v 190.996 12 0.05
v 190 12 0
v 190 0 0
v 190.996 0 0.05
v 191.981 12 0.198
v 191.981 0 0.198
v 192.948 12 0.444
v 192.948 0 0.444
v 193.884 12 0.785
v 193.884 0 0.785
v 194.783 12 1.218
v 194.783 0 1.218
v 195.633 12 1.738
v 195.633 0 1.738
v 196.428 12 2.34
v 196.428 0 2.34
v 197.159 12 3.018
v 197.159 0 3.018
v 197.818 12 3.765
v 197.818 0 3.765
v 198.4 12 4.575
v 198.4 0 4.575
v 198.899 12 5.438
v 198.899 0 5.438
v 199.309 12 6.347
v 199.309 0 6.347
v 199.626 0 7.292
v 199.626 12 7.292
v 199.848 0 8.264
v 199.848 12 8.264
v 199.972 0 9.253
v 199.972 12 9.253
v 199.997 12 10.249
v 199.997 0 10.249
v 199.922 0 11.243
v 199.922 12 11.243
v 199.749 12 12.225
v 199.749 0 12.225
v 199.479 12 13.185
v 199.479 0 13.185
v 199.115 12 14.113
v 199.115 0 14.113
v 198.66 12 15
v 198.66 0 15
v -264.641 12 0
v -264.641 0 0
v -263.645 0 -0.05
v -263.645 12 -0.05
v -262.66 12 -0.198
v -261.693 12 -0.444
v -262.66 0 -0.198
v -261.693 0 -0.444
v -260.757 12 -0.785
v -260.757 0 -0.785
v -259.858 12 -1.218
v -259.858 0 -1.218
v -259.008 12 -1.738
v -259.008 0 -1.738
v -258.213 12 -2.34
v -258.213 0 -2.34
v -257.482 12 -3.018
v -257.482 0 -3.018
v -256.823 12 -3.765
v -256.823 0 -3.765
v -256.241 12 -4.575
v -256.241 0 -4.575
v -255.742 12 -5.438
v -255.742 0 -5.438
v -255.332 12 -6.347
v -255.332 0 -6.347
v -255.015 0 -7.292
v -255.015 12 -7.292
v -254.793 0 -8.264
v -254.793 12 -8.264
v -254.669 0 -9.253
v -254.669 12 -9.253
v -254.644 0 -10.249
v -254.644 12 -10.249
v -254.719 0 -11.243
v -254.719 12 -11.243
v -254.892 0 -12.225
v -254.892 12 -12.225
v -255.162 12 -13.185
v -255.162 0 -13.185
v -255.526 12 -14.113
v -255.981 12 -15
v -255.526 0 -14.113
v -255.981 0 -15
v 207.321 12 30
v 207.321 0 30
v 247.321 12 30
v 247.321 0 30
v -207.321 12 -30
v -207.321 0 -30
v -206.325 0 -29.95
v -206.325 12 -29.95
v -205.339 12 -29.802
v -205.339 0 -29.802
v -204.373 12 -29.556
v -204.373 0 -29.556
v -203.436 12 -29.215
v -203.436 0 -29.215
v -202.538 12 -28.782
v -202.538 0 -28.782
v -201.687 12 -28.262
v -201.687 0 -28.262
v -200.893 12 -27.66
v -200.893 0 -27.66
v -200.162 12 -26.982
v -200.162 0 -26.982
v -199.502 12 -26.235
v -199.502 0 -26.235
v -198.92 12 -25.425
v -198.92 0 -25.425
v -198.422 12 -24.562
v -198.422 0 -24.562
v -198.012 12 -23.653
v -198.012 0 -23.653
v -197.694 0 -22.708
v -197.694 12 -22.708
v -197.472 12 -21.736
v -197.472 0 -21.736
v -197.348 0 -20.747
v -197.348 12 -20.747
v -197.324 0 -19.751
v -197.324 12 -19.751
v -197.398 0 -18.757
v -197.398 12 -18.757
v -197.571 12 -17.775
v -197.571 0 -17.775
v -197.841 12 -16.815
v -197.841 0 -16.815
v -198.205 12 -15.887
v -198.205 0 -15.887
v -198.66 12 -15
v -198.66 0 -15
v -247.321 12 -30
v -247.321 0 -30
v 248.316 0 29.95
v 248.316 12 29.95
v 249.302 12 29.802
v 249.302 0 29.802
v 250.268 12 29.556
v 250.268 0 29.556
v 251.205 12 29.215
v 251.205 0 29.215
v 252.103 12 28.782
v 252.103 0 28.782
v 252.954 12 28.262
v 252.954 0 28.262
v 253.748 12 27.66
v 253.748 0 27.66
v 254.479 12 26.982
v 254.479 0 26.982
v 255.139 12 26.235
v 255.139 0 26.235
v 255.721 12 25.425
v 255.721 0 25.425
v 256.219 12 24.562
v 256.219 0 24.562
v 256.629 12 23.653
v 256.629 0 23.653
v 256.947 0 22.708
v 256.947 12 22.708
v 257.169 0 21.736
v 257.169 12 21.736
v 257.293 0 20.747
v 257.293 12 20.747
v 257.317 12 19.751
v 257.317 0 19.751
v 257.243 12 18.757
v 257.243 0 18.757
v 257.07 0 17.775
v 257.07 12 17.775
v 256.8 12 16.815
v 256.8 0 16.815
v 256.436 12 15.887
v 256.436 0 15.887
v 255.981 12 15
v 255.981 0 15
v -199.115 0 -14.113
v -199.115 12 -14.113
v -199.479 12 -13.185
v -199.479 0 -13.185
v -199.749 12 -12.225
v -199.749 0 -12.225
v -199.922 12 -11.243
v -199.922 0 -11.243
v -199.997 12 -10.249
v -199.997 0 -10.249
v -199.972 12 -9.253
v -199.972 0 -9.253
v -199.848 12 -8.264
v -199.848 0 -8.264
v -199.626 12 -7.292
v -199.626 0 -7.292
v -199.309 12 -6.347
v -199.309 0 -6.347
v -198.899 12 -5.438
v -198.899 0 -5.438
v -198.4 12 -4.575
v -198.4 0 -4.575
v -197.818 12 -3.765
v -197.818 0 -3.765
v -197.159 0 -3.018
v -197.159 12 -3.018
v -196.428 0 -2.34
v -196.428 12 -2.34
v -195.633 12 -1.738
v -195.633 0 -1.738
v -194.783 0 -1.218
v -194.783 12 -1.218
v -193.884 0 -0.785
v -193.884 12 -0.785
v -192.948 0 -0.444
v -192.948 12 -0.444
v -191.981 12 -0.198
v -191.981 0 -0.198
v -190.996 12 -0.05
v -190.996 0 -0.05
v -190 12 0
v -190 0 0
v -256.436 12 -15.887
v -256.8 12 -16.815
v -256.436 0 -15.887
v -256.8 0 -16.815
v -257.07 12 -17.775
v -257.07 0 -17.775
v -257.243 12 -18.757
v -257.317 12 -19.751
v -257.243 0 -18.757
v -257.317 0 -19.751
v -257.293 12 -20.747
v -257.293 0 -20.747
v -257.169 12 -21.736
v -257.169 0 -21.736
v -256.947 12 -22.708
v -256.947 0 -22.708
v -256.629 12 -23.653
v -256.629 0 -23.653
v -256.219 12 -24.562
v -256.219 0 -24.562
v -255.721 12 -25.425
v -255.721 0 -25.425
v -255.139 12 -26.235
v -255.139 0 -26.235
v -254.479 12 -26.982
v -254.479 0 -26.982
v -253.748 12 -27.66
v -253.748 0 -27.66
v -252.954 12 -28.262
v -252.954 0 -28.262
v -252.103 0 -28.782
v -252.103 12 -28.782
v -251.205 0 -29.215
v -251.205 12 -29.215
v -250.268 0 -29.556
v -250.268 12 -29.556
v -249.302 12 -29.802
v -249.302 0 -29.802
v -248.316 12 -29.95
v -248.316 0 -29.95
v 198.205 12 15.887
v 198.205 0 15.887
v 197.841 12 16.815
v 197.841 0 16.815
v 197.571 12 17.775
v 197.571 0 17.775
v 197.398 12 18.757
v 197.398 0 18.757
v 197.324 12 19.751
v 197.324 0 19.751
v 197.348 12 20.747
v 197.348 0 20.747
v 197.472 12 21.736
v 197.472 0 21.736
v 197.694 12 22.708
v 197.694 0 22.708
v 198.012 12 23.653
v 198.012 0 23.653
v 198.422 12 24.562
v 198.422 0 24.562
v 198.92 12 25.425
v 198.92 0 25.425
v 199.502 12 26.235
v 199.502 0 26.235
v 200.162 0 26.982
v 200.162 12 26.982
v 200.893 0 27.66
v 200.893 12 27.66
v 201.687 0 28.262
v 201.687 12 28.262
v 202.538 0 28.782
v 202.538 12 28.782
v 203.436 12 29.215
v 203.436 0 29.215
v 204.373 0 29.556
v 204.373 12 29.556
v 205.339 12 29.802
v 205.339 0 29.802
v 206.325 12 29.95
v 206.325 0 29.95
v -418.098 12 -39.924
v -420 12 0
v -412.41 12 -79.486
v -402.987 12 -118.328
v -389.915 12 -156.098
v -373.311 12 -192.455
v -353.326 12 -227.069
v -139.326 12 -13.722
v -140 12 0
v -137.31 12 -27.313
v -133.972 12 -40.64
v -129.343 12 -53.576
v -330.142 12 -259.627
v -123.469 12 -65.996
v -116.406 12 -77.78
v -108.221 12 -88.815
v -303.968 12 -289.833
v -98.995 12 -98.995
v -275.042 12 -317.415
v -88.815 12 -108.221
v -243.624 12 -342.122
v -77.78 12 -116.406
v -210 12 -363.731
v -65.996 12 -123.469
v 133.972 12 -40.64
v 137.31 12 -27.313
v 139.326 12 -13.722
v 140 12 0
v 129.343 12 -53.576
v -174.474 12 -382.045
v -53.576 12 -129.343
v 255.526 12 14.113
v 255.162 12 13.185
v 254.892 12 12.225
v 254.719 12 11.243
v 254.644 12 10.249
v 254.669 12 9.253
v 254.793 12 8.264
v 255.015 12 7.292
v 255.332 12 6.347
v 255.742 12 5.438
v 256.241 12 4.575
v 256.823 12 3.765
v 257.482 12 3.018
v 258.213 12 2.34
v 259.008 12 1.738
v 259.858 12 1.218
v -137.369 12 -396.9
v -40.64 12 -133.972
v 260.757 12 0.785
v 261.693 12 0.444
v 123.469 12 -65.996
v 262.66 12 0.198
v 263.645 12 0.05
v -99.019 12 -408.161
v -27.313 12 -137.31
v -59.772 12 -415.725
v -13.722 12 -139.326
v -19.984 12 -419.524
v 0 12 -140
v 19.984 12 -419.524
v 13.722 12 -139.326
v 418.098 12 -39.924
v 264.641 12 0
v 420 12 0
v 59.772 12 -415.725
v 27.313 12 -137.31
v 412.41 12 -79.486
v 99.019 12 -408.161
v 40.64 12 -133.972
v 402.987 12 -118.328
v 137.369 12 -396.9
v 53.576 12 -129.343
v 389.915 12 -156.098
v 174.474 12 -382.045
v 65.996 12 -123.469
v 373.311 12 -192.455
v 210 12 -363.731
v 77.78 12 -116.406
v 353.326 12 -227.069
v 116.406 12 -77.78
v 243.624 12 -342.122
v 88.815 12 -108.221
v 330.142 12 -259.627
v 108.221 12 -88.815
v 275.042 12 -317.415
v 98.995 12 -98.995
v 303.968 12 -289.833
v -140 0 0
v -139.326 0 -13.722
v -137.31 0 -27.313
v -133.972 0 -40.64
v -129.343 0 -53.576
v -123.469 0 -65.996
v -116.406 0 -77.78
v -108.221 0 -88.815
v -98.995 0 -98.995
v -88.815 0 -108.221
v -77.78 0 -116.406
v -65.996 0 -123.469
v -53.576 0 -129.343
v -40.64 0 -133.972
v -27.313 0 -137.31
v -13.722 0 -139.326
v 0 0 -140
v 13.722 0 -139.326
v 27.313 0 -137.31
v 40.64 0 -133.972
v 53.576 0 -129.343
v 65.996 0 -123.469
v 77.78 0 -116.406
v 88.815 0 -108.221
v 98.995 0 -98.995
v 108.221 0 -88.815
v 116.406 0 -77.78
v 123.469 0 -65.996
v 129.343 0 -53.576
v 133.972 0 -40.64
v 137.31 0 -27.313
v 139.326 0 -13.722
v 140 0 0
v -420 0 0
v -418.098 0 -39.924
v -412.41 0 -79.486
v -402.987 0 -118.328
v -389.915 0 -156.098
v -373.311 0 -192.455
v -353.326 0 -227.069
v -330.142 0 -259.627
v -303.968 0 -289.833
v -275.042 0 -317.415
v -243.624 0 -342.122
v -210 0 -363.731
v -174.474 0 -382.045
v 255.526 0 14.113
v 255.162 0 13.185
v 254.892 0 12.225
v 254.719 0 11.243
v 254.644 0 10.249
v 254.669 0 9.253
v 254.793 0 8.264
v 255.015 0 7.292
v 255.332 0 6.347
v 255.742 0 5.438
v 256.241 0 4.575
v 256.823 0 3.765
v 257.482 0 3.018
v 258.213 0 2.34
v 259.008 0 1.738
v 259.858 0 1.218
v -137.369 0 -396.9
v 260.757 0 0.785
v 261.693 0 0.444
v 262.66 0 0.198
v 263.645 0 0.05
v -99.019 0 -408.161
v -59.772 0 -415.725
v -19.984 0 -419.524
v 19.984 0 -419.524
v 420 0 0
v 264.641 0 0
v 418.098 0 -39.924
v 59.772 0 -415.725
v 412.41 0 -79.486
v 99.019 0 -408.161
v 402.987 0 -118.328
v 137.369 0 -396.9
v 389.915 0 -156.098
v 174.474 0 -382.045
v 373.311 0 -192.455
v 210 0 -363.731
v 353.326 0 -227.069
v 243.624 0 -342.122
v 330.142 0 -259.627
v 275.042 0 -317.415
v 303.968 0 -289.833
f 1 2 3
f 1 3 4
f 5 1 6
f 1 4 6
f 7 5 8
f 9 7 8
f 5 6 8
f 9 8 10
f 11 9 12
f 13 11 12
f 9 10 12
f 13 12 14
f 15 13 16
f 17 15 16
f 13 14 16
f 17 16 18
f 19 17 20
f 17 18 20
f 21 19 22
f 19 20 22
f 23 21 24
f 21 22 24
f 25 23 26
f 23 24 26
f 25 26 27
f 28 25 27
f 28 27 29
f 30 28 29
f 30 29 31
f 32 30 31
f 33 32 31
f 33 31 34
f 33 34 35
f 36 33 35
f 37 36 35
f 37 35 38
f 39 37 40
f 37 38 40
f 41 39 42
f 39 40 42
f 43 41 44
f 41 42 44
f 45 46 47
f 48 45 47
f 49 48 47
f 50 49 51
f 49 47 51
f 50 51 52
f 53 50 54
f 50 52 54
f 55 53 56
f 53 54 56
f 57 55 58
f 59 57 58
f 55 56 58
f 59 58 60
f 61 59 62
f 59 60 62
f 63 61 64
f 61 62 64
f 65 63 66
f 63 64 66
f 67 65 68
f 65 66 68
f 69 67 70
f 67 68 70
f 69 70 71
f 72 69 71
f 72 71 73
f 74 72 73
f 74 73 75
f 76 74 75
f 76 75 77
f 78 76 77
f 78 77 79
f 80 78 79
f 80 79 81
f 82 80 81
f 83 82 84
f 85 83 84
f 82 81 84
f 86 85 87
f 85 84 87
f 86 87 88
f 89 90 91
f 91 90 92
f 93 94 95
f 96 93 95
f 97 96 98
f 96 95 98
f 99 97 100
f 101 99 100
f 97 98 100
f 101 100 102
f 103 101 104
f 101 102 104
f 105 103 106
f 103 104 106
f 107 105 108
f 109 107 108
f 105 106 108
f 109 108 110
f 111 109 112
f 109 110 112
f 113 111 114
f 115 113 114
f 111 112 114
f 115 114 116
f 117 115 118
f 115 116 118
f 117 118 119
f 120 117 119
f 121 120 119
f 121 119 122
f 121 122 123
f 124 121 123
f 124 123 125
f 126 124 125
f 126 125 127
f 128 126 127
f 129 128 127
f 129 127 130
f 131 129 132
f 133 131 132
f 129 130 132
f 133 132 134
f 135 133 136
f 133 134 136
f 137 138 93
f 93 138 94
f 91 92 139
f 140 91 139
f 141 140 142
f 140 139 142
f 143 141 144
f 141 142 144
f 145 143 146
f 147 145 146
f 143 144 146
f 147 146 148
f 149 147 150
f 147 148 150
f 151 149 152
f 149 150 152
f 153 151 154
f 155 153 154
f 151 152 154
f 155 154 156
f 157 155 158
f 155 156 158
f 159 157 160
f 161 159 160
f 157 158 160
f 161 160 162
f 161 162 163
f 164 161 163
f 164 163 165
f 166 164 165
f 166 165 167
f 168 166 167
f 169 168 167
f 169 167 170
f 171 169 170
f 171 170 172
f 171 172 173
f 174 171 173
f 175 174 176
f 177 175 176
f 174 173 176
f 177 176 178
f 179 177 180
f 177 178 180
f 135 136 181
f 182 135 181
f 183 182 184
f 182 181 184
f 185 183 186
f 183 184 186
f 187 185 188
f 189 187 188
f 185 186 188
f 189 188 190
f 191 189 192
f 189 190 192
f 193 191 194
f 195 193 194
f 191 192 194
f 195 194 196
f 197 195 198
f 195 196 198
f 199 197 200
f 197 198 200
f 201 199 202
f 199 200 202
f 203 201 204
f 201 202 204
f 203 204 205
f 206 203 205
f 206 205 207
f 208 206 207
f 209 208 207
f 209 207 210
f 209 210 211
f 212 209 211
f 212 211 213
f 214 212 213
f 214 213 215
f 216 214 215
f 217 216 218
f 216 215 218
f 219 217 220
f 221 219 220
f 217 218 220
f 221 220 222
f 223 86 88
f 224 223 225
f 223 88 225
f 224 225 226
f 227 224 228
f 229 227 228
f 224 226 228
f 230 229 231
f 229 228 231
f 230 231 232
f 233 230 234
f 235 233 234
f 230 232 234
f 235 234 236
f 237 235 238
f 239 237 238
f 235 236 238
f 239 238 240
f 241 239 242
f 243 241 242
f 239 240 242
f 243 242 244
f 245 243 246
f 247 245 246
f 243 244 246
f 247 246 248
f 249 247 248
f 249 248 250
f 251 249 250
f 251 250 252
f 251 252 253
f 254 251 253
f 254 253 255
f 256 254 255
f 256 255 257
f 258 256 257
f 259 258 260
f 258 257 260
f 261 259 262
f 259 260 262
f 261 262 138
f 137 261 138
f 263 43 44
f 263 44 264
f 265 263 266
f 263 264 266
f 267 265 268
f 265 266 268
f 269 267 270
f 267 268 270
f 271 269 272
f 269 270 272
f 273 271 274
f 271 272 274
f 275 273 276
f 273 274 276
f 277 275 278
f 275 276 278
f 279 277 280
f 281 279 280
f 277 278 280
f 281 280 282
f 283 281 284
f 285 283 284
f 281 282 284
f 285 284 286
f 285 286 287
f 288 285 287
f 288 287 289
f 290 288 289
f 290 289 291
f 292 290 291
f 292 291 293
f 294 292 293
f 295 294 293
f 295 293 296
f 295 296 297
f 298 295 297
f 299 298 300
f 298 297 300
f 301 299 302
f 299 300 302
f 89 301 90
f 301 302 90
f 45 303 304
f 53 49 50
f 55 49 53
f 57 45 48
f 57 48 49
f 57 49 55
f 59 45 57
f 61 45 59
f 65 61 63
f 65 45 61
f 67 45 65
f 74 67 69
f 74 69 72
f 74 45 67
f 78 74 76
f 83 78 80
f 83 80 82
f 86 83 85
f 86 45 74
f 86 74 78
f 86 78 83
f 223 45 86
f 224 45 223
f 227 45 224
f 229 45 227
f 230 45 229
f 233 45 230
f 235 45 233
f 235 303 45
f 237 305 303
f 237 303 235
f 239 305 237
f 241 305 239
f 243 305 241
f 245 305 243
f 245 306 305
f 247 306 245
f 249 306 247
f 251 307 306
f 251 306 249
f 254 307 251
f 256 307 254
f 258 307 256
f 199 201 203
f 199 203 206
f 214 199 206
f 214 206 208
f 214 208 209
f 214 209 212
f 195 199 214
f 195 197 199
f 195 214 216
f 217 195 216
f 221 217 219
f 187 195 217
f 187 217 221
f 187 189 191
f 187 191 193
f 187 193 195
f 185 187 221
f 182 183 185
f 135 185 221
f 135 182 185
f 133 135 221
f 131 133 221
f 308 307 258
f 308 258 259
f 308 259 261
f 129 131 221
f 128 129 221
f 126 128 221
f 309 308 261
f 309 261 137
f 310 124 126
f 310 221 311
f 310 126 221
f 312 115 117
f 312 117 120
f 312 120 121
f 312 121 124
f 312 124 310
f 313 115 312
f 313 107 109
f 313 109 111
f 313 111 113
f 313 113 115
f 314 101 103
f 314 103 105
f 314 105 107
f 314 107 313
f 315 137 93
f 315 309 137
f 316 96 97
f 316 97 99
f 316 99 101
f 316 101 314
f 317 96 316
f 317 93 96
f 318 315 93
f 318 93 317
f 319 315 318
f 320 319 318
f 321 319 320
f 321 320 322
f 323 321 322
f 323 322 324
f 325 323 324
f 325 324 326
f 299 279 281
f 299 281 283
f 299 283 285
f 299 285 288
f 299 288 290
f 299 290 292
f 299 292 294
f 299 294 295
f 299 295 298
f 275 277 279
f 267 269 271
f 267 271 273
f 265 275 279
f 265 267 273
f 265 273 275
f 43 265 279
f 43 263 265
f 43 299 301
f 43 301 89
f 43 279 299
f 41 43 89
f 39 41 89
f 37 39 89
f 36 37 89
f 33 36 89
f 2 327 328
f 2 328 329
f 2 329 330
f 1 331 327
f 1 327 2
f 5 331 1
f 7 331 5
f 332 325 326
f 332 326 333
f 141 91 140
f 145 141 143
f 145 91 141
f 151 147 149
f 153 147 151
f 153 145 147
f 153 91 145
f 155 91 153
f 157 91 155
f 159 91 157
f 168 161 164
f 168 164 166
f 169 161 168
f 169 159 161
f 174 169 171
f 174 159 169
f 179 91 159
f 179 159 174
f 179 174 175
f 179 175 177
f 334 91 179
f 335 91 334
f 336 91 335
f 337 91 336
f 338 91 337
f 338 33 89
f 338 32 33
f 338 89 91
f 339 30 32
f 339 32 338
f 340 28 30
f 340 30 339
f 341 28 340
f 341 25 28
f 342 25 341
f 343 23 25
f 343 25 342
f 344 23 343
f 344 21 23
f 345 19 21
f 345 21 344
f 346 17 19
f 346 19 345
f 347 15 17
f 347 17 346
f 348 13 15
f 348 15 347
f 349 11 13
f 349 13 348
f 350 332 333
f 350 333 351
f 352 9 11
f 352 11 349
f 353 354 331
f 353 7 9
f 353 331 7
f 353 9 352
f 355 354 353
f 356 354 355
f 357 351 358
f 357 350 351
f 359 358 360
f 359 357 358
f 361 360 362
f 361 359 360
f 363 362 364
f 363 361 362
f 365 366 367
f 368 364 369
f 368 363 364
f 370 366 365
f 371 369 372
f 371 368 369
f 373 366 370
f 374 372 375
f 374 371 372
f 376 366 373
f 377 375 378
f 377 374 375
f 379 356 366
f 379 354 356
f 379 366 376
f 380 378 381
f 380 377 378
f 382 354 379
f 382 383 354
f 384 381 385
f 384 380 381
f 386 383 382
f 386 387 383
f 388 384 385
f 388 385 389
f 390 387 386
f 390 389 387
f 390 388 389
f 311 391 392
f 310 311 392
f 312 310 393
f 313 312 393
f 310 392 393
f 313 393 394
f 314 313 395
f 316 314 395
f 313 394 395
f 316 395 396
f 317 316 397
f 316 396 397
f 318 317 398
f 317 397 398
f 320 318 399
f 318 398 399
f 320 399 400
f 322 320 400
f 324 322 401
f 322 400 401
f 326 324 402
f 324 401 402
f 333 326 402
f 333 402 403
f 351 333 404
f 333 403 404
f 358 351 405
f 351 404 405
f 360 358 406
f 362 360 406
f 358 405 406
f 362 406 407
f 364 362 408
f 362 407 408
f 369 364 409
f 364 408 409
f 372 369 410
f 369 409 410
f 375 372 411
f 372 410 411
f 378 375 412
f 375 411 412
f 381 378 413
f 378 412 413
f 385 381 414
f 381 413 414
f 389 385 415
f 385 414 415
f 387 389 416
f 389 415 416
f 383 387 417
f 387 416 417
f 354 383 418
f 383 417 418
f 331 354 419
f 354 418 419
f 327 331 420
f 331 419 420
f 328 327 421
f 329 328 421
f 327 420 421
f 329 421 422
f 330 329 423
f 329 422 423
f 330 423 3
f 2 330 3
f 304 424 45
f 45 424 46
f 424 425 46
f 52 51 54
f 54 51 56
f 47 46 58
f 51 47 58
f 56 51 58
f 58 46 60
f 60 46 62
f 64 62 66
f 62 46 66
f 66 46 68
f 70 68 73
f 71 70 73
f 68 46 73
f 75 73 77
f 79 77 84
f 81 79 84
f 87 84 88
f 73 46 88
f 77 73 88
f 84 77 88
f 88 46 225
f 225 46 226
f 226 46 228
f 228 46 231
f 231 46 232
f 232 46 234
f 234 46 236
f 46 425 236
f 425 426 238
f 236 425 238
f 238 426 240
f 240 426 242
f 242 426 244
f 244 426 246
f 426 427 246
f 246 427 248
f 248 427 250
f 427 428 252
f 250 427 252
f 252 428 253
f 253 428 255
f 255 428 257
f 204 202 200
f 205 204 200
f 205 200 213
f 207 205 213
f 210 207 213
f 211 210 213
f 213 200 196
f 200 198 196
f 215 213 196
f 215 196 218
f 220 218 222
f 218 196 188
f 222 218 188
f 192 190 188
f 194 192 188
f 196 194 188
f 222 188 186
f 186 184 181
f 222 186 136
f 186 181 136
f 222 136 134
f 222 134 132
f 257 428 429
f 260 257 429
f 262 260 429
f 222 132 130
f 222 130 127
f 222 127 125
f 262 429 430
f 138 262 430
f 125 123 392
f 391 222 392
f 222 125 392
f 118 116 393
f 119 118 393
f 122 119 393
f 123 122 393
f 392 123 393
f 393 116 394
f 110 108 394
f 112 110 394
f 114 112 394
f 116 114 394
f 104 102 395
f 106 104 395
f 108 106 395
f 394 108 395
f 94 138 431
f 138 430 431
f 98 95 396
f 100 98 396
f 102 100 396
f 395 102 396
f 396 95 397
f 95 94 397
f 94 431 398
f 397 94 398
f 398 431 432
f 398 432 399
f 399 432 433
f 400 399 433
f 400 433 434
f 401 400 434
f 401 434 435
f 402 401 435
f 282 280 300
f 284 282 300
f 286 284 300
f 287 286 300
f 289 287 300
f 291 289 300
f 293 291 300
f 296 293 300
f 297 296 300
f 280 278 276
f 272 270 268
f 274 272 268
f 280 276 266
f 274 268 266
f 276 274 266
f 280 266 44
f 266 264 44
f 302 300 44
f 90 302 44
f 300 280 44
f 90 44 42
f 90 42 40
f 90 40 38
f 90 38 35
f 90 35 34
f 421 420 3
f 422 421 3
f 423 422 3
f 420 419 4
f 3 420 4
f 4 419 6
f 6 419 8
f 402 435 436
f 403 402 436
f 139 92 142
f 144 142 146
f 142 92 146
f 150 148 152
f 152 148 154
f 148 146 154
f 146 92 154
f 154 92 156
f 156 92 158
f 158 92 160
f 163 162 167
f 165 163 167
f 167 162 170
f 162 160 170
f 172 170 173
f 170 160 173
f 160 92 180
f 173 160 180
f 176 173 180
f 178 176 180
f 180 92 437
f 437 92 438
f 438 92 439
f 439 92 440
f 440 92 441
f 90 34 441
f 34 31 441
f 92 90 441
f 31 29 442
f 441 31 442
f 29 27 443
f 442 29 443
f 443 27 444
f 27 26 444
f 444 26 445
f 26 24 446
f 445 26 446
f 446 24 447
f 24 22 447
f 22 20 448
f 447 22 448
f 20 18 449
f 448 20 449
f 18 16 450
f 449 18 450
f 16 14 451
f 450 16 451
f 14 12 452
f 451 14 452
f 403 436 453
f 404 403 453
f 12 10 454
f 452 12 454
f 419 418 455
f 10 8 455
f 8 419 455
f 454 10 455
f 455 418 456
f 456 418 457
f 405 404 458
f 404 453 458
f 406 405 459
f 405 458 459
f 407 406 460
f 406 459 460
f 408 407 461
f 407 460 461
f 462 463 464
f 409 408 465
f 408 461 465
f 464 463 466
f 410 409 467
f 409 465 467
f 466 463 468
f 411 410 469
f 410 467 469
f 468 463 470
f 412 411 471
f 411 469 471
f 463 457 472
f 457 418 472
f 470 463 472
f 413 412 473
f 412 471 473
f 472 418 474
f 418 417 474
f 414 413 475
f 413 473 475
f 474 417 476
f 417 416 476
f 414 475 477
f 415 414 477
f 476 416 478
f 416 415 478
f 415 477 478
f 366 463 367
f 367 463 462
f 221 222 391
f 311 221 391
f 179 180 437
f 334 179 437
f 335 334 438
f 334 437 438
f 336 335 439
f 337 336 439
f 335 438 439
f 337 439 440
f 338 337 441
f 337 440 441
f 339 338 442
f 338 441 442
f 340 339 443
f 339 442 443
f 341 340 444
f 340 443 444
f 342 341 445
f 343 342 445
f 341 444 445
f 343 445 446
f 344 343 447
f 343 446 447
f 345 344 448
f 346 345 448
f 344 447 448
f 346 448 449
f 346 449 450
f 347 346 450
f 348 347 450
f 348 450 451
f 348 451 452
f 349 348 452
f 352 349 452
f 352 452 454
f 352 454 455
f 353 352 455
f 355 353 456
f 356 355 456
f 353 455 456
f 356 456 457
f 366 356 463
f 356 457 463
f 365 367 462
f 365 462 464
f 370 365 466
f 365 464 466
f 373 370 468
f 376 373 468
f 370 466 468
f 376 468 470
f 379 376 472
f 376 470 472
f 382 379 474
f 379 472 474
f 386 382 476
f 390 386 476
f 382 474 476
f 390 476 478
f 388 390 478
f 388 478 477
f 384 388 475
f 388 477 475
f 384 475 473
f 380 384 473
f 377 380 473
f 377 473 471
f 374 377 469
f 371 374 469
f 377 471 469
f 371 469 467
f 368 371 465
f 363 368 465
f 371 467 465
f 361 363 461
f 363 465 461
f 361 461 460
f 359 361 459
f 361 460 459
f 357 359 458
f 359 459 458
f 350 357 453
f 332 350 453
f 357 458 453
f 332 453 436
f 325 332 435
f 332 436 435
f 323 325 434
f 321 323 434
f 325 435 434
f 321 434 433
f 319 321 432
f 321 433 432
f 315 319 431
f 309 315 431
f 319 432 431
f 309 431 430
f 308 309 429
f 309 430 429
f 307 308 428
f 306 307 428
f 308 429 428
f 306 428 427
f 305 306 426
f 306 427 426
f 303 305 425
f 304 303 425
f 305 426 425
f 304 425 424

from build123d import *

# Parameters (mm, degrees)
BOSS_EXTRUDE1_DEPTH = 12


with BuildPart() as part:
    # Sketch1 → Boss-Extrude1 (new body)
    with BuildSketch(Plane(origin=(0, 0, 0), x_dir=(1, 0, 0), z_dir=(0, 1, 0))):
        with BuildLine():
            Line((-420, 0), (-264.641016151, 0))
            ThreePointArc((-264.641016151, 0), (-255.980762114, 5), (-255.980762114, 15))
            ThreePointArc((-255.980762114, 15), (-255.980762114, 25), (-247.320508076, 30))
            Line((-247.320508076, 30), (-207.320508076, 30))
            ThreePointArc((-207.320508076, 30), (-198.660254038, 25), (-198.660254038, 15))
            ThreePointArc((-198.660254038, 15), (-198.660254038, 5), (-190, 0))
            Line((-190, 0), (-140, 0))
            ThreePointArc((-140, 0), (1.07e-06, 140), (140, -2.139e-06))
            Line((140, -2.139e-06), (190, -2.149e-06))
            ThreePointArc((190, -2.149e-06), (198.660254037, -5.000002151), (198.660254035, -15.000002151))
            ThreePointArc((198.660254035, -15.000002151), (198.660254033, -25.000002151), (207.32050807, -30.000002153))
            Line((207.32050807, -30.000002153), (247.32050807, -30.000002161))
            ThreePointArc((247.32050807, -30.000002161), (255.980762108, -25.000002163), (255.98076211, -15.000002163))
            ThreePointArc((255.98076211, -15.000002163), (255.980762113, -5.000002163), (264.641016151, -2.165e-06))
            Line((264.641016151, -2.165e-06), (420, -2.196e-06))
            ThreePointArc((420, -2.196e-06), (1.098e-06, 420), (-420, 0))
        make_face()
    extrude(amount=BOSS_EXTRUDE1_DEPTH)


solid = part.part
